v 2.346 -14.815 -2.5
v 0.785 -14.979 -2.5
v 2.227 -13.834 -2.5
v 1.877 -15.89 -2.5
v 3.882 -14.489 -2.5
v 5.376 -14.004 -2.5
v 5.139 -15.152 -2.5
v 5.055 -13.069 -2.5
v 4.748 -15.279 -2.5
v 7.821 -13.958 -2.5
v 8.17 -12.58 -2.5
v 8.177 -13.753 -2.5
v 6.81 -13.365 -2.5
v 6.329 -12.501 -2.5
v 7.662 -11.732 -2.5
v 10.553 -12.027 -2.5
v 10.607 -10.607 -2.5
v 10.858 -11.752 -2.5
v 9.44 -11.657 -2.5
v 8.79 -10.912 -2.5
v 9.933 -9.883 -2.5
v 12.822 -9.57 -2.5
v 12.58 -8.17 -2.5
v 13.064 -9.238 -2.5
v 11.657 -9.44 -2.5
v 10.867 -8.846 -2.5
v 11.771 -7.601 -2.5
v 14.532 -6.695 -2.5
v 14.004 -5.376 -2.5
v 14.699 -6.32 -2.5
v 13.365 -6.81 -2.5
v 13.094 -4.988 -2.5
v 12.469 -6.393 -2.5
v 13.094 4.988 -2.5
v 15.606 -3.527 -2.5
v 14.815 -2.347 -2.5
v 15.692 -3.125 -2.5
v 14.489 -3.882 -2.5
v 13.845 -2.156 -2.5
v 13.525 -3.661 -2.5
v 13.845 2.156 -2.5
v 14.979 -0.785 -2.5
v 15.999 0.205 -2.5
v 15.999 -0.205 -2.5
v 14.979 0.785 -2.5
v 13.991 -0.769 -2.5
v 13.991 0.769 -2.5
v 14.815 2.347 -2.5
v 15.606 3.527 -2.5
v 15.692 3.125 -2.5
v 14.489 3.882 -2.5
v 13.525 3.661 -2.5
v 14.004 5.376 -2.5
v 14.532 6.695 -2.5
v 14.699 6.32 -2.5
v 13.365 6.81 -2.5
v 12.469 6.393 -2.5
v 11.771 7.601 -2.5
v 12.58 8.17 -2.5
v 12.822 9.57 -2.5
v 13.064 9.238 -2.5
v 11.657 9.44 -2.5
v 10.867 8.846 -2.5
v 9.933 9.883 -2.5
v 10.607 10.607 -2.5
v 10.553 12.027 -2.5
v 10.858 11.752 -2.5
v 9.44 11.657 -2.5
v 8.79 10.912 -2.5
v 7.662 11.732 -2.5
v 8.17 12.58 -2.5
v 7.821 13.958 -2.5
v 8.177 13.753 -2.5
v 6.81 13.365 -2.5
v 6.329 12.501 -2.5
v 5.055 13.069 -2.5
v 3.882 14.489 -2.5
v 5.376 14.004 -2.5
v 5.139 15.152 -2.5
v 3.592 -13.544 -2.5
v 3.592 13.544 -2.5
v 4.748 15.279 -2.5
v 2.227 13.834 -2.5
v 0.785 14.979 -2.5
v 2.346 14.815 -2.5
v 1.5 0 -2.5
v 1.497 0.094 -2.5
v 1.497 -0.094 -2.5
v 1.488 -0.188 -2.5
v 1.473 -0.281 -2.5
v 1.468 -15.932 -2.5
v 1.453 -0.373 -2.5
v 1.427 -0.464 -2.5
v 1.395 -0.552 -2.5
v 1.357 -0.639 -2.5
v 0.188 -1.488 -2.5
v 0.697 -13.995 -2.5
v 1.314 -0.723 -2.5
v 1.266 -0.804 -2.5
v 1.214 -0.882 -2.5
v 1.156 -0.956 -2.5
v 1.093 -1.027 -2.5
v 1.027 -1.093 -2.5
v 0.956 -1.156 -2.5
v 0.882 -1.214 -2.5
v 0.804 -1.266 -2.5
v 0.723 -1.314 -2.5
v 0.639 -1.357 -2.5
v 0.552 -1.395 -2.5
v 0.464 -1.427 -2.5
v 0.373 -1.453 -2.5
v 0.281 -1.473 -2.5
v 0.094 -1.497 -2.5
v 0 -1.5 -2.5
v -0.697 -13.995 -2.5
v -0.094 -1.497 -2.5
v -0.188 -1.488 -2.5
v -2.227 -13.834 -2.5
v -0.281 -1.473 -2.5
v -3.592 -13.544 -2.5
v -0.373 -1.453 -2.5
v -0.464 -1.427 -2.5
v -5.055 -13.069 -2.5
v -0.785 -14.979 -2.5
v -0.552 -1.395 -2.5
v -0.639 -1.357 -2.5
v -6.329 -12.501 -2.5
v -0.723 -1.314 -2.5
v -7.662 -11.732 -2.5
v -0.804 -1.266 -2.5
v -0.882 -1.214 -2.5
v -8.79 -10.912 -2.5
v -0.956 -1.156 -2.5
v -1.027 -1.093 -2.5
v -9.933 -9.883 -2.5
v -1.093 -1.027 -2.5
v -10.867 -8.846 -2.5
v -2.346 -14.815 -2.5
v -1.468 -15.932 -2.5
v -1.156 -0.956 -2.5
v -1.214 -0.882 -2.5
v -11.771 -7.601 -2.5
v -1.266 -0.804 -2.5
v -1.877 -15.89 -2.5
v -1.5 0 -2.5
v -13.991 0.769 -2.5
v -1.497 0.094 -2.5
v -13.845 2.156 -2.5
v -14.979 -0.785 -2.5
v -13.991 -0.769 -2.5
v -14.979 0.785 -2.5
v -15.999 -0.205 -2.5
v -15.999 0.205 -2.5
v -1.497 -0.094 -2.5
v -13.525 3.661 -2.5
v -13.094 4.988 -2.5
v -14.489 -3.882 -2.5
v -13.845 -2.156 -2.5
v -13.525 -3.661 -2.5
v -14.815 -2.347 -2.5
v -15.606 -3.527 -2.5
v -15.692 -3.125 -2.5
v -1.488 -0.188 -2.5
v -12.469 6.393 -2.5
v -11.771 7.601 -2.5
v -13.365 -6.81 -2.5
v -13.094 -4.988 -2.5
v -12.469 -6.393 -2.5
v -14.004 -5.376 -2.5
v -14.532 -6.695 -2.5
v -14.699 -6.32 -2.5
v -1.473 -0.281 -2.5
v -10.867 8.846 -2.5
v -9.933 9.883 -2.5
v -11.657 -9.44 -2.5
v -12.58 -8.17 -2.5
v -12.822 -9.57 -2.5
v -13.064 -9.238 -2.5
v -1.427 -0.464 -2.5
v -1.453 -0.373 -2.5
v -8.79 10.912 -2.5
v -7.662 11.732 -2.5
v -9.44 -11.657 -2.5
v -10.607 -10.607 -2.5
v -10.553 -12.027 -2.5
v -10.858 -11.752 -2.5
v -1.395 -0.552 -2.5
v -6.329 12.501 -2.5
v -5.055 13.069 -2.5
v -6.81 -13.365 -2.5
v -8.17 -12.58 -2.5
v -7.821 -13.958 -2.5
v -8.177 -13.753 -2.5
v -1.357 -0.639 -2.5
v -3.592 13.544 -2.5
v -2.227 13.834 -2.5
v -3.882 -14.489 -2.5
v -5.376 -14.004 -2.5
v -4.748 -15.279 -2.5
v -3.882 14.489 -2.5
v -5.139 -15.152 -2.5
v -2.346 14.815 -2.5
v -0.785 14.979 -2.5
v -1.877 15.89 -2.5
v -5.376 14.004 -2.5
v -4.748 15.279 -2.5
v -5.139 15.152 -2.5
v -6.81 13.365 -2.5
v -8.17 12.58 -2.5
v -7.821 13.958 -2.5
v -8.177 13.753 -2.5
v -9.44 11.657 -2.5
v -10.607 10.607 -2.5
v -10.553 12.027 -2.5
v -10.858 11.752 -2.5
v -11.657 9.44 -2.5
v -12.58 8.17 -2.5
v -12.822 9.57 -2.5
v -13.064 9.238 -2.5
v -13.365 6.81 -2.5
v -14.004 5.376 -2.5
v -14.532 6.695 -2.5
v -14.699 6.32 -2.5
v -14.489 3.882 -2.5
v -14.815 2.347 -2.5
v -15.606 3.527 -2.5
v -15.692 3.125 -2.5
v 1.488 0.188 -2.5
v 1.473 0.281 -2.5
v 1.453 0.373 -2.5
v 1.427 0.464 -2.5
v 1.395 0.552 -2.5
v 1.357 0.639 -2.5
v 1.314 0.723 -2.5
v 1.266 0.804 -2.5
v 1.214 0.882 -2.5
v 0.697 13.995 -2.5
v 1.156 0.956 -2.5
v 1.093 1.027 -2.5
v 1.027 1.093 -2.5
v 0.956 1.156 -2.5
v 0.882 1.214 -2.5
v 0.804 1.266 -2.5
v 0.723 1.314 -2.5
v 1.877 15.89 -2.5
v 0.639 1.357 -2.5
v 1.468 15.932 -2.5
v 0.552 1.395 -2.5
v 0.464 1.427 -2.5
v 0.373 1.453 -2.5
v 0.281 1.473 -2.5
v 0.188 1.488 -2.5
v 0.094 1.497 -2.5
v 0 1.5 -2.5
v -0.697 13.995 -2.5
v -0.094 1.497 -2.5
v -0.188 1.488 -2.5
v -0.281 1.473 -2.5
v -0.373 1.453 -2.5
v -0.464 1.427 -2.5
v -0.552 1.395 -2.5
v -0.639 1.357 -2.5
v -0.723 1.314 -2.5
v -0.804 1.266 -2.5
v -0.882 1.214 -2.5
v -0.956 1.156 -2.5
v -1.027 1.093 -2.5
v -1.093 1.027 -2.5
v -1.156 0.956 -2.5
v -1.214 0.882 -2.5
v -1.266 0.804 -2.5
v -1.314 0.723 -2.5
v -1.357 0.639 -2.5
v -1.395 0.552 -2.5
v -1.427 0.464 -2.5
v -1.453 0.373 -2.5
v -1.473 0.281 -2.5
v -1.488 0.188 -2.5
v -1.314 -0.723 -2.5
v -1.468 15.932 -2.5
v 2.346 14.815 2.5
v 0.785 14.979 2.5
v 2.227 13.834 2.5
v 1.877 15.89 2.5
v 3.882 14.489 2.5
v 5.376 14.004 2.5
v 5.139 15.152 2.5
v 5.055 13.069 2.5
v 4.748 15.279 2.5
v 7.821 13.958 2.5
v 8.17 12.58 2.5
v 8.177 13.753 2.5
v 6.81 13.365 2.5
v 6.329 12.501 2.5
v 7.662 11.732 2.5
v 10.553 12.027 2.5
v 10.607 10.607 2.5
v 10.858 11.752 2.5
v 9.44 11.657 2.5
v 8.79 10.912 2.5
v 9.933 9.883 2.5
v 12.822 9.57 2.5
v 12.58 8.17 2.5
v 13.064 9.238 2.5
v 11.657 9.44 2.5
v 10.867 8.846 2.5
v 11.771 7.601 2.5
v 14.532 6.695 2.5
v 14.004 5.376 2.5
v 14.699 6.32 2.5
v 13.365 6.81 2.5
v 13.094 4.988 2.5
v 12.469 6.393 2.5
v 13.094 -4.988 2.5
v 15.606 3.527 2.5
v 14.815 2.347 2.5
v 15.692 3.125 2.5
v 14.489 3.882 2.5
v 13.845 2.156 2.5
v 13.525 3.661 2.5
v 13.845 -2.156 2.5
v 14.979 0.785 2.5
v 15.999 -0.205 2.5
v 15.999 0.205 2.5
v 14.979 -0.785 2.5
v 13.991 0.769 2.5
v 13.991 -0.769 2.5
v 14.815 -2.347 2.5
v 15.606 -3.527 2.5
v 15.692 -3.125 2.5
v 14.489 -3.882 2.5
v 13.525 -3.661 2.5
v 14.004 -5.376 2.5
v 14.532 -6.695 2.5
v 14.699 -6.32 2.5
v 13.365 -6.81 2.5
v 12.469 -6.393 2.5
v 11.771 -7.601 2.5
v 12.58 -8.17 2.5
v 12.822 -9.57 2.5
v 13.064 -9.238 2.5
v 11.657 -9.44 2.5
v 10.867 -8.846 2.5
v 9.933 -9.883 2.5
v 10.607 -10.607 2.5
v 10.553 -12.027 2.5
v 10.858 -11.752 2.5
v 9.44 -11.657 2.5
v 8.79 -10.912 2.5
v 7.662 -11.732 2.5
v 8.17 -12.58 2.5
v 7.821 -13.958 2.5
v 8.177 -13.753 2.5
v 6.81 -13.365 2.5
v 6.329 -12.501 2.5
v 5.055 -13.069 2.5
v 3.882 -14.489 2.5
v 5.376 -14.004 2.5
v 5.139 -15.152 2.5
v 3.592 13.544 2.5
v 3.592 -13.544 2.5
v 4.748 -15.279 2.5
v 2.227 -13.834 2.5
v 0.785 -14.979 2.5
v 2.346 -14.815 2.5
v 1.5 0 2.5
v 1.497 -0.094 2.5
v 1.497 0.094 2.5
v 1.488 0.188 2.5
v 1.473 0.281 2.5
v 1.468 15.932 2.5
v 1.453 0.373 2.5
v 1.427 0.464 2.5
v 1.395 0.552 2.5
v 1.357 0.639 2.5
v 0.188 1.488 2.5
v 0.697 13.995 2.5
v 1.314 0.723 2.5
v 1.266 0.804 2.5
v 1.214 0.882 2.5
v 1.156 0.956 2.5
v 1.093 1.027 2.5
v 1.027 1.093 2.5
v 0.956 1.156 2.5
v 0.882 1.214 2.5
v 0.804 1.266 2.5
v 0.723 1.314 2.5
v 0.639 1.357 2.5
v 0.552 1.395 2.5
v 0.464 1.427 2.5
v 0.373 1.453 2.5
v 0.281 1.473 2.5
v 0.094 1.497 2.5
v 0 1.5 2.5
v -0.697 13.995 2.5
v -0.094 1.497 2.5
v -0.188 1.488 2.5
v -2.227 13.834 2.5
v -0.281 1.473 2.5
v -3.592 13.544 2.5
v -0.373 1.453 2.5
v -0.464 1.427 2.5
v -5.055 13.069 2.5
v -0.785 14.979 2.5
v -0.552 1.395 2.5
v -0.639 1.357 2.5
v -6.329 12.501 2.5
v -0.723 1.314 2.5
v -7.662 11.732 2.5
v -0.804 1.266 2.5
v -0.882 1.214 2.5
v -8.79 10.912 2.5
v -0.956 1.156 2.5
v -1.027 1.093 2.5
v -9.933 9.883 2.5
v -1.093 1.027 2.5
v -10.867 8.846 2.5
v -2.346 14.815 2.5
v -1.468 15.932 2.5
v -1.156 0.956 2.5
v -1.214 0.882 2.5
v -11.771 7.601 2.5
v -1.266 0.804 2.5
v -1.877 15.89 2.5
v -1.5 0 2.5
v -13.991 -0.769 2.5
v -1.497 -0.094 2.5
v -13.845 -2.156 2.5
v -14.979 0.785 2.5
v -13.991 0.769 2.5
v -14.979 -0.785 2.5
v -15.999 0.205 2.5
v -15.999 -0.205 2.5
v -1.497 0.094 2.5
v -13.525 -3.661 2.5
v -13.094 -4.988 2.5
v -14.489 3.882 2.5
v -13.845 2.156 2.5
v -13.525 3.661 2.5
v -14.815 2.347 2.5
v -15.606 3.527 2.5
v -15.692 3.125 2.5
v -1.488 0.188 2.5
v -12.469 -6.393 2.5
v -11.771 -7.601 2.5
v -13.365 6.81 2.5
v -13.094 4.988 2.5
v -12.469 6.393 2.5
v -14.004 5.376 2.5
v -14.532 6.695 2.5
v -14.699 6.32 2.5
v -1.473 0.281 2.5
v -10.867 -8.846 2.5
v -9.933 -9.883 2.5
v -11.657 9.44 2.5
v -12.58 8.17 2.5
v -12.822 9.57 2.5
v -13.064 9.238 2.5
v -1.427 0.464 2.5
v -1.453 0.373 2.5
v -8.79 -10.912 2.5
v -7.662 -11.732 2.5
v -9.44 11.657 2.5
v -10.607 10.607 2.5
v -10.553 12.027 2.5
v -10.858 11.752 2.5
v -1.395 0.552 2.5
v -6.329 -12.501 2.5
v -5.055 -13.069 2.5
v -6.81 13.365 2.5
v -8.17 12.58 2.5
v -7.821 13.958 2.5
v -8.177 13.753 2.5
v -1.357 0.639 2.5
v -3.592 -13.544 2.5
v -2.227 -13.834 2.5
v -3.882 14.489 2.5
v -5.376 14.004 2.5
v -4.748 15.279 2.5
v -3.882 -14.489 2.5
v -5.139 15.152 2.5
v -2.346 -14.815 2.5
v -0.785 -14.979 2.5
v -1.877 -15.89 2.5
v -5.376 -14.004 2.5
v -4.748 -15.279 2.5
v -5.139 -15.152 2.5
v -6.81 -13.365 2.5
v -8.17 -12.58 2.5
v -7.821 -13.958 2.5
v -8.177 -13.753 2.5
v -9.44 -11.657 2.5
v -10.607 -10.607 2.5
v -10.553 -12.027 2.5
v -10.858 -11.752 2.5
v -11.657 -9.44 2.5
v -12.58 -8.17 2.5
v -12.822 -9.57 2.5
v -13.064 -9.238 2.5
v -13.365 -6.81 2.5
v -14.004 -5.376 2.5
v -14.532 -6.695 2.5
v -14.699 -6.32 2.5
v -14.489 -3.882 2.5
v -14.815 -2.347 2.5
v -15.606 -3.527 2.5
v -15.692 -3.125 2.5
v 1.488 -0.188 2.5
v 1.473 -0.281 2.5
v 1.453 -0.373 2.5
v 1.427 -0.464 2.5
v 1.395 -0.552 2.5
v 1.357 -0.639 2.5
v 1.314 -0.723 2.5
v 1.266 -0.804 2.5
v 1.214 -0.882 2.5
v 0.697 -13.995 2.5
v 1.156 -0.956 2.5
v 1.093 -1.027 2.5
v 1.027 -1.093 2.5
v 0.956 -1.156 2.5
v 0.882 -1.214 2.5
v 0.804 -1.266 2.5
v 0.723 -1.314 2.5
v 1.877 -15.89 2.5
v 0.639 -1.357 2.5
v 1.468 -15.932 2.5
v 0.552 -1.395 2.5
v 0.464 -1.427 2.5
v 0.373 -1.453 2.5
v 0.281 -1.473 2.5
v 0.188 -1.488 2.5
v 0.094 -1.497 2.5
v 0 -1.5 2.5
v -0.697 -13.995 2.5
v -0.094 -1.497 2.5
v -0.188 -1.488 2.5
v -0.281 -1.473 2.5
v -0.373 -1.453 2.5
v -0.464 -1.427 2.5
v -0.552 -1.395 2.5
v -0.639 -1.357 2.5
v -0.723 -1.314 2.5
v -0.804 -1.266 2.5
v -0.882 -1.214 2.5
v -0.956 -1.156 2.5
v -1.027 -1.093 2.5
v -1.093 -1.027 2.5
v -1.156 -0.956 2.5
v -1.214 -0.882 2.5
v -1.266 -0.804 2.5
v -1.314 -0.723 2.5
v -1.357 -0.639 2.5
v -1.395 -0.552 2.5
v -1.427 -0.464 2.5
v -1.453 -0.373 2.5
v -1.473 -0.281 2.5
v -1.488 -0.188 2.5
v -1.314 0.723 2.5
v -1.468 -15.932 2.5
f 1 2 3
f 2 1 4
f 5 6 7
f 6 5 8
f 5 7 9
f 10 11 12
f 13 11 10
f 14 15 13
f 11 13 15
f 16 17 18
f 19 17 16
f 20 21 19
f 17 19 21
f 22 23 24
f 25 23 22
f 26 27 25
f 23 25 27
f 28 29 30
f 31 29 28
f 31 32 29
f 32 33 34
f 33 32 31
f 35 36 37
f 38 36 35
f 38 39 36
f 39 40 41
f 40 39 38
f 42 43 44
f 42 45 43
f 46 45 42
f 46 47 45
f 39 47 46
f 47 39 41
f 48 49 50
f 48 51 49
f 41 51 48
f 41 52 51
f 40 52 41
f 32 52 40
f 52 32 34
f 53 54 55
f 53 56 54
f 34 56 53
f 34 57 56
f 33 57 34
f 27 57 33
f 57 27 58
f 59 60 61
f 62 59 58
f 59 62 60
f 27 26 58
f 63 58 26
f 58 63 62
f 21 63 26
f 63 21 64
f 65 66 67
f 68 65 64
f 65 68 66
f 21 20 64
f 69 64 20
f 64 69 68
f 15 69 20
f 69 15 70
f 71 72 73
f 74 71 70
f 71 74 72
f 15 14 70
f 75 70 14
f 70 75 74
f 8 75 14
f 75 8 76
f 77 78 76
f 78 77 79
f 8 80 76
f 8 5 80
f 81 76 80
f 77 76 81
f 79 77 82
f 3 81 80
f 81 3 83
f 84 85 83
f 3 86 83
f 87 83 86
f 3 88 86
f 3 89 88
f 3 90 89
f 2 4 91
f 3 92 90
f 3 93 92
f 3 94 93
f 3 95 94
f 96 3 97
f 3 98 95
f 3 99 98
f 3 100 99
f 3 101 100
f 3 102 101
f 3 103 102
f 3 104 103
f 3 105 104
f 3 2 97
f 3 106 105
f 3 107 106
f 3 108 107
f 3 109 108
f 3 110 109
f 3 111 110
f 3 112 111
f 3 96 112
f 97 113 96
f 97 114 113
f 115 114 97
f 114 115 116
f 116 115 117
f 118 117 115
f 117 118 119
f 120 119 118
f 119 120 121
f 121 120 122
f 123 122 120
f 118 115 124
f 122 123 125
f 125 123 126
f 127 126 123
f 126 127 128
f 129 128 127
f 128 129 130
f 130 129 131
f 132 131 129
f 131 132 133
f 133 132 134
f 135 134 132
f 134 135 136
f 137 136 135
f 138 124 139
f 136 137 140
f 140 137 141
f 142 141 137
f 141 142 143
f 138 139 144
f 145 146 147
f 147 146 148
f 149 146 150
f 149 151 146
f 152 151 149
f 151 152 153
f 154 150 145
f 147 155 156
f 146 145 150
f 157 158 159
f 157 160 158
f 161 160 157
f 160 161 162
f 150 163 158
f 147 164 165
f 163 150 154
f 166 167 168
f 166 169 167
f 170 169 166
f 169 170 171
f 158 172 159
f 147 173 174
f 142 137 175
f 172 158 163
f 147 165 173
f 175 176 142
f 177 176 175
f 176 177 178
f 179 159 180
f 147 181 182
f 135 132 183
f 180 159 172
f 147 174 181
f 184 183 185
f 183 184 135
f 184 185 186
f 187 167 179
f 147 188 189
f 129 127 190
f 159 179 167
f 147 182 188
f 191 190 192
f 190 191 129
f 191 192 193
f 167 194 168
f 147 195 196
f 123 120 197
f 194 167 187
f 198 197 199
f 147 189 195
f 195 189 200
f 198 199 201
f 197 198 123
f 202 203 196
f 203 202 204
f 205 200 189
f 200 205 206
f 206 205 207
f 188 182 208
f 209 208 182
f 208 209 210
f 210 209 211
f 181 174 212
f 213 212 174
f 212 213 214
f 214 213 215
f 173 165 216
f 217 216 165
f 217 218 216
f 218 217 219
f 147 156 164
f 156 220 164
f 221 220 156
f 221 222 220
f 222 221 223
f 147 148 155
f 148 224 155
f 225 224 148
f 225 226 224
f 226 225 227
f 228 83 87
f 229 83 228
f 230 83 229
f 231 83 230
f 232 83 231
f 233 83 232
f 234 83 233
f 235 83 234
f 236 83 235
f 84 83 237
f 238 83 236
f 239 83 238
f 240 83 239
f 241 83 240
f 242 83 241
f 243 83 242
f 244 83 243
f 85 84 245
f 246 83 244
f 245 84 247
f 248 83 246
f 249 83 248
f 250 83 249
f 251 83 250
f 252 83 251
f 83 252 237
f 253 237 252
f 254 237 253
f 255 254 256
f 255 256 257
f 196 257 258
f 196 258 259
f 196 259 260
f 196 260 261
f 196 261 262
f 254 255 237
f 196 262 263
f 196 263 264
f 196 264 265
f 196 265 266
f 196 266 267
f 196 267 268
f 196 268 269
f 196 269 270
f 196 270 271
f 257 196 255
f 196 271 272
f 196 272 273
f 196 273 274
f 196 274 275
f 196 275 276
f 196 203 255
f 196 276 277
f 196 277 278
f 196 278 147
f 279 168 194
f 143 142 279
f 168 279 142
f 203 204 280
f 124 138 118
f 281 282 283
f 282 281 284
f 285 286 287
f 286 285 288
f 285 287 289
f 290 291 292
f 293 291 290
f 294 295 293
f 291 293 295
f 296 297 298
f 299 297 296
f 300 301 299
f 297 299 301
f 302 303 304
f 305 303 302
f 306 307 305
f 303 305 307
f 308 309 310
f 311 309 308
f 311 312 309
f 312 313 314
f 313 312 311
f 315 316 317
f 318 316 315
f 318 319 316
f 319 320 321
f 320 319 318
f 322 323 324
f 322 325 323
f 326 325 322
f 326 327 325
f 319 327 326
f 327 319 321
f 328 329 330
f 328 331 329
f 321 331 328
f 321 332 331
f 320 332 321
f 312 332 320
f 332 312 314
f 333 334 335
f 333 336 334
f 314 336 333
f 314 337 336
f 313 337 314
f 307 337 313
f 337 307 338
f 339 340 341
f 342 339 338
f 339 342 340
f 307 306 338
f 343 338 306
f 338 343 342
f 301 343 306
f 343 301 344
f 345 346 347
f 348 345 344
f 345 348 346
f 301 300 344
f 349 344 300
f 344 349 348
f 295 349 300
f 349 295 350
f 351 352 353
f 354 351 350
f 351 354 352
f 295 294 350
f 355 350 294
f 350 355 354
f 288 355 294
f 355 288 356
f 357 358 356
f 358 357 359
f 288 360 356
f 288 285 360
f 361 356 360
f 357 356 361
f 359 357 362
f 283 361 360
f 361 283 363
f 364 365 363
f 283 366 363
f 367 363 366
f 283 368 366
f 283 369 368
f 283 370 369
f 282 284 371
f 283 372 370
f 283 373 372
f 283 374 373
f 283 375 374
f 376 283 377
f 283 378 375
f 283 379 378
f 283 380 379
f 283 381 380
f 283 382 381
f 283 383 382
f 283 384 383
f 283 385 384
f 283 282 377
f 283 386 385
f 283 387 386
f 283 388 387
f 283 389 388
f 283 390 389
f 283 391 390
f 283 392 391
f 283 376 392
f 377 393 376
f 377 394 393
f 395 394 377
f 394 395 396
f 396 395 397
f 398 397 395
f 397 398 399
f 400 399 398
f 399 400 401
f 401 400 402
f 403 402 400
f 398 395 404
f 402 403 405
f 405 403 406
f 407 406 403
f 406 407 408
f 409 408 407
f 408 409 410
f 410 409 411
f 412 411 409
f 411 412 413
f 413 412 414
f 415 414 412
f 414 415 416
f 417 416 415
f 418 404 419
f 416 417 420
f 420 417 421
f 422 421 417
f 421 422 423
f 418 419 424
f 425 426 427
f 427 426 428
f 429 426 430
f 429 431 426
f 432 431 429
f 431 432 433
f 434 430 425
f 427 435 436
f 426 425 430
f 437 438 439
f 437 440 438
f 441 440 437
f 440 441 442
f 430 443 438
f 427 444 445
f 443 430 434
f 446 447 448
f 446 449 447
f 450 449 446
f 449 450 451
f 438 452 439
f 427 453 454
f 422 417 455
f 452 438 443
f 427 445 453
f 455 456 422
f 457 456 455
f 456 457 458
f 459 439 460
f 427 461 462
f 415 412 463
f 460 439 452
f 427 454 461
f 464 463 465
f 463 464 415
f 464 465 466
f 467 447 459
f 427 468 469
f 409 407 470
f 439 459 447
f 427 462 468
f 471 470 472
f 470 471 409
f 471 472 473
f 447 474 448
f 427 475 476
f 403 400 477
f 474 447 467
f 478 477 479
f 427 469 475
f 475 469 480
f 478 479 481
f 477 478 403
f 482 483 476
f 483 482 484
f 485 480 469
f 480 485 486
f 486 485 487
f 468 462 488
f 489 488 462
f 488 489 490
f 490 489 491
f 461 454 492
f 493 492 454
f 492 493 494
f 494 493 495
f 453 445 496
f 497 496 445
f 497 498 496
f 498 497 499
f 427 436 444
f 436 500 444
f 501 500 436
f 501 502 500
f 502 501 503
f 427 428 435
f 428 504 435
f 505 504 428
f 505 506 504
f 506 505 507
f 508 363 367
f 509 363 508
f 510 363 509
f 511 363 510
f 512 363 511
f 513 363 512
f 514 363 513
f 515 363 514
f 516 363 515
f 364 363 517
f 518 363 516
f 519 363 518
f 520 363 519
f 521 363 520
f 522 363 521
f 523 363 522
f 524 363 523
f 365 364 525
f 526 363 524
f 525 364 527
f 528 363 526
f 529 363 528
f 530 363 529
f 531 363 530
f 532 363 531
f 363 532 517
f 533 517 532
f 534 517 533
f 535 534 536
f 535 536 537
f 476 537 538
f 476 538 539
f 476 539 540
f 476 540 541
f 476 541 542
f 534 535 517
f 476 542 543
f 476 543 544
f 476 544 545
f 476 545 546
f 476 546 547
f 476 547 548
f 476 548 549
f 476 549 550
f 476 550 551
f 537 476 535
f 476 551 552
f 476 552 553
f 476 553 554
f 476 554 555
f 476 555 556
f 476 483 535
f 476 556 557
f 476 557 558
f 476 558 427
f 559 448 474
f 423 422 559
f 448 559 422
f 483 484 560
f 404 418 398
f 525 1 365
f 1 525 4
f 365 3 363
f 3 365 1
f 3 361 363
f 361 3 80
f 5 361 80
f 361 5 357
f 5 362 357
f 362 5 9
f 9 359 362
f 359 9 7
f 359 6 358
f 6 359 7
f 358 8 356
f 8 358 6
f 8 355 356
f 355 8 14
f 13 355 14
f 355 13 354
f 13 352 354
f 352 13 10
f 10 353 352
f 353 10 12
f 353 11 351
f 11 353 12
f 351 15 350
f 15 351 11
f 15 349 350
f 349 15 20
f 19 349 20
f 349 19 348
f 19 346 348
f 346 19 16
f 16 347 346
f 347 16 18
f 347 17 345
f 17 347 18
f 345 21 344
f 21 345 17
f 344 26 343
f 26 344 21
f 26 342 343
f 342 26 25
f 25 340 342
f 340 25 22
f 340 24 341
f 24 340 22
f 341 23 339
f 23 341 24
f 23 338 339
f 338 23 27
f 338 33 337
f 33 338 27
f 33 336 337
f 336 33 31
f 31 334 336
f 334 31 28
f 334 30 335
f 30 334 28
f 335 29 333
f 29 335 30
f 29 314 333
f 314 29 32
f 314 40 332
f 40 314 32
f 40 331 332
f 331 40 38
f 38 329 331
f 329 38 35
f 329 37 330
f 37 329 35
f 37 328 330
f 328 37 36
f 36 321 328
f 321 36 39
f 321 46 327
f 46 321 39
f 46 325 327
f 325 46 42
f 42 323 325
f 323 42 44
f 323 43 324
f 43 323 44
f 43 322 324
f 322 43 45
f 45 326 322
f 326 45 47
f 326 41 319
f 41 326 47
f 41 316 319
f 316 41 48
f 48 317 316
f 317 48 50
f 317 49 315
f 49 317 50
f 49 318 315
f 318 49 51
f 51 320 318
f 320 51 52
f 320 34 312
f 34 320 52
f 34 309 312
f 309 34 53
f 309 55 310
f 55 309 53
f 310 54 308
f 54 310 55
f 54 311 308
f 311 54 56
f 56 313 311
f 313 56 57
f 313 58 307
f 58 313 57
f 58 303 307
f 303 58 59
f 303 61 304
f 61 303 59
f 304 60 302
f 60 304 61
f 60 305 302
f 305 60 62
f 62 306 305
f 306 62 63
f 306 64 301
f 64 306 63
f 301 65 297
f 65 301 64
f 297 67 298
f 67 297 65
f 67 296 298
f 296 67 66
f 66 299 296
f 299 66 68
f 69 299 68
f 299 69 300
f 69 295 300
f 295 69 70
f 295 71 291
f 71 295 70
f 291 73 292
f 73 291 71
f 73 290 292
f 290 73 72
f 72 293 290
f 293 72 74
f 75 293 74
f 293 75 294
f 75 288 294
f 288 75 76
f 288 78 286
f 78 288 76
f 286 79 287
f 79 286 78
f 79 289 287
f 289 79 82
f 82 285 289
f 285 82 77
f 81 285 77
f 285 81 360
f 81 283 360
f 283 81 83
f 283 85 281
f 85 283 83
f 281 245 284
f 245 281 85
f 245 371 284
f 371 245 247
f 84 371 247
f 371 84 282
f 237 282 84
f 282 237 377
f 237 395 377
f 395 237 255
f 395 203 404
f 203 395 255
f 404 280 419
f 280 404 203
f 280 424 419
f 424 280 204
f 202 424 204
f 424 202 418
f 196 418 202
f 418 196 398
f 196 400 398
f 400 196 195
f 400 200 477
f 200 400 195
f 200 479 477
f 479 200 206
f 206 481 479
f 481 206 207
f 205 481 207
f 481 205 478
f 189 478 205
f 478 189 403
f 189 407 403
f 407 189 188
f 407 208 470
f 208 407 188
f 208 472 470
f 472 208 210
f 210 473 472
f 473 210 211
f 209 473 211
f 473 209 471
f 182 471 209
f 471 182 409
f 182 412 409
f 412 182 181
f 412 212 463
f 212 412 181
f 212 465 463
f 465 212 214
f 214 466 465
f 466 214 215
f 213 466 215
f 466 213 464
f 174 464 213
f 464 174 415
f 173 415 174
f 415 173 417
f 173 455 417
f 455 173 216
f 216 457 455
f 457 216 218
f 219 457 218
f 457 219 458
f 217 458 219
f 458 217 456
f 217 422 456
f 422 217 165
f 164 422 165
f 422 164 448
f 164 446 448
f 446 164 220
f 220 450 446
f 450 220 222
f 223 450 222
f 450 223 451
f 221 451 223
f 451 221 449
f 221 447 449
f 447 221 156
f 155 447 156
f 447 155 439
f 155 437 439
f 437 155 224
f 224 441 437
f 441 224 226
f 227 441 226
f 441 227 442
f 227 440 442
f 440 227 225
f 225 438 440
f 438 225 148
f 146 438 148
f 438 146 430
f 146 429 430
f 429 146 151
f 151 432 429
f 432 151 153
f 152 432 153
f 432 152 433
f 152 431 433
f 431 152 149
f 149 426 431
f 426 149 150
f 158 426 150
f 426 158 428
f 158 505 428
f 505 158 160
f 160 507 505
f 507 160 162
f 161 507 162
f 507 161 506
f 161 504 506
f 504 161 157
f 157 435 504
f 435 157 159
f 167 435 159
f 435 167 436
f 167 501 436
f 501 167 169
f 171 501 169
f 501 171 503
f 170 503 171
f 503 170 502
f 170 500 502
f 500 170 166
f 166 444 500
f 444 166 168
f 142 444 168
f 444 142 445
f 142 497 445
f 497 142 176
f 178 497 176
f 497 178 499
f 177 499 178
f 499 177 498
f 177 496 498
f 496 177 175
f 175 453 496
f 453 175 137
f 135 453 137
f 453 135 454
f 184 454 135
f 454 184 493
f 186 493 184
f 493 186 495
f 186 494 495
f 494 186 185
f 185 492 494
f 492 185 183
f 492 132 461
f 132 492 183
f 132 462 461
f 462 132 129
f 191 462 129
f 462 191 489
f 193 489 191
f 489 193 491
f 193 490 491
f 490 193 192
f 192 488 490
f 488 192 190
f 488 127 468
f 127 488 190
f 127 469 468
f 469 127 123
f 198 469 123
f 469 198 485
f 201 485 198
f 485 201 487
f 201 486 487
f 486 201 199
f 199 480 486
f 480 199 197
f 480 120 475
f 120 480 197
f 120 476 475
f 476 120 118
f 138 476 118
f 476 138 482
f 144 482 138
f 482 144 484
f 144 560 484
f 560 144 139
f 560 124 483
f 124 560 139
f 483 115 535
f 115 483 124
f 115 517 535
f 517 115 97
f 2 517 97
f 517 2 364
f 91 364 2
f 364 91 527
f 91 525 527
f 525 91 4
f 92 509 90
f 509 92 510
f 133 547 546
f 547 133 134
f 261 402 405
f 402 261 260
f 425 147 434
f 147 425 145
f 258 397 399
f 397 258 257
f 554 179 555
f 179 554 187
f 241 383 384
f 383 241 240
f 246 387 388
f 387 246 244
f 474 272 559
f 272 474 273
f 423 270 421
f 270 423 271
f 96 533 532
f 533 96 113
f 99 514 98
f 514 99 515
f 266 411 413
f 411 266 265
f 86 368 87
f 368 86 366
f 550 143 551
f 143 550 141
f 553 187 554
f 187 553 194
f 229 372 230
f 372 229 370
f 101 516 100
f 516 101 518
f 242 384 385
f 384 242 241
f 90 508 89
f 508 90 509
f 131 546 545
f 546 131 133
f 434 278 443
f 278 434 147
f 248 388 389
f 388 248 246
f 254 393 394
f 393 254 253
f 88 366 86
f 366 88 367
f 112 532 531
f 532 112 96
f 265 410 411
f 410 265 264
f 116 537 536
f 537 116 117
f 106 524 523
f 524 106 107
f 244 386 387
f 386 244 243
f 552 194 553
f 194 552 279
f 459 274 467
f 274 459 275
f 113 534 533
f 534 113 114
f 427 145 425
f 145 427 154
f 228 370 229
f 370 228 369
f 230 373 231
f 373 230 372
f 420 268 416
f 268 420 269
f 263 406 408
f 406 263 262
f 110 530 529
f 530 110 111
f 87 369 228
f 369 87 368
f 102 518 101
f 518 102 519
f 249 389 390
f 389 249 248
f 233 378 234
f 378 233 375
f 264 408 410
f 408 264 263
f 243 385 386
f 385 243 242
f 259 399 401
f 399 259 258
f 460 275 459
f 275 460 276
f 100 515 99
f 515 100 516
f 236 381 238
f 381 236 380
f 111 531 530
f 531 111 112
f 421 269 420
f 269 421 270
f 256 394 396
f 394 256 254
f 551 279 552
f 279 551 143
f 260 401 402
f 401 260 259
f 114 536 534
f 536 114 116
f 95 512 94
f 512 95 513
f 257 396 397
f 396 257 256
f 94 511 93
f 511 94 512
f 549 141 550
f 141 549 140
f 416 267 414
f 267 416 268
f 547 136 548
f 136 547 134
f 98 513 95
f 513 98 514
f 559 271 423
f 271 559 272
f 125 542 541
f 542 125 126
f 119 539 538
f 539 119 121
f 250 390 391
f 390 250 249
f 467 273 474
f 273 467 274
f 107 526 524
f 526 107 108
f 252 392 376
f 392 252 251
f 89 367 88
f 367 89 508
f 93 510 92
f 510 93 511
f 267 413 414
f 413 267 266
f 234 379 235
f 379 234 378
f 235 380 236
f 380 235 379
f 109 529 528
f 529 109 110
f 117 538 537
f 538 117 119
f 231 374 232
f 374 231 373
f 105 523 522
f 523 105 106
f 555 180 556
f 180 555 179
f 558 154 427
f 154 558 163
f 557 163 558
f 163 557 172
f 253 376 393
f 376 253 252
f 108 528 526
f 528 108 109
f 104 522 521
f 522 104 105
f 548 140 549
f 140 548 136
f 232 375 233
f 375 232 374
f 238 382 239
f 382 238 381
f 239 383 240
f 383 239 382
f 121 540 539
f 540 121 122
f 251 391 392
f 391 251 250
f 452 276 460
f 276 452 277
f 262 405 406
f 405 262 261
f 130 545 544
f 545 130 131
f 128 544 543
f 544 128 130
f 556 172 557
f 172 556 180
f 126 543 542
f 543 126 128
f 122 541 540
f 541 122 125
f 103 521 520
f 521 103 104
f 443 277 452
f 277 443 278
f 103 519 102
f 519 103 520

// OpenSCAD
height = 5;
type = "Spur"; // [Spur,Cog,Double Helix, Single Helix]
teeth = 30;	//	[18:50]

hole = "Yes"; //[Yes,No]
rotate_Offset_double_Helix_only = 5; //[0:20]

holeSize = 1.5;//don't make too big or your gear will disappear
scale = 100;//this is here temperarily I would not reccomend changing!


if (type == "Spur")
{
if(hole == "Yes")
{
hole();
}
else
{
spur();
}
}
else if(type == "Cog")
{
if(hole == "Yes")
{
hole();
}
else
{
cog();
}
}
else if(type == "Double Helix")
{

if(hole == "Yes")
{
hole();
}
else
{
double_helix();
}
}
else if (type == "Single Helix")
{
if(hole == "Yes")
{
hole();
}
else
{
single_helix();
}
}


module gear(number_of_teeth,
		circular_pitch=false, diametral_pitch=false,
		pressure_angle=20, clearance = 0)
{

	//Convert diametrial pitch to our native circular pitch
	circular_pitch = (circular_pitch!=false?circular_pitch:180/diametral_pitch);

	// Pitch diameter: Diameter of pitch circle.
	pitch_diameter  =  number_of_teeth * circular_pitch / 180;
	pitch_radius = pitch_diameter/2;

	// Base Circle
	base_diameter = pitch_diameter*cos(pressure_angle);
	base_radius = base_diameter/2;

	// Diametrial pitch: Number of teeth per unit length.
	pitch_diametrial = number_of_teeth / pitch_diameter;

	// Addendum: Radial distance from pitch circle to outside circle.
	addendum = 1/pitch_diametrial;

	//Outer Circle
	outer_radius = pitch_radius+addendum;
	outer_diameter = outer_radius*2;

	// Dedendum: Radial distance from pitch circle to root diameter
	dedendum = addendum + clearance;

	// Root diameter: Diameter of bottom of tooth spaces.
	root_radius = pitch_radius-dedendum;
	root_diameter = root_radius * 2;

	half_thick_angle = 360 / (4 * number_of_teeth);

	union()
	{
		rotate(half_thick_angle) circle($fn=number_of_teeth*2, r=root_radius*1.001);

		for (i= [1:number_of_teeth])
		//for (i = [0])
		{
			rotate([0,0,i*360/number_of_teeth])
			{
				involute_gear_tooth(
					pitch_radius = pitch_radius,
					root_radius = root_radius,
					base_radius = base_radius-6,
					outer_radius = outer_radius,
					half_thick_angle = half_thick_angle);
			}
		}
	}
}


module involute_gear_tooth(
					pitch_radius,
					root_radius,
					base_radius,
					outer_radius,
					half_thick_angle
					)
{
	pitch_to_base_angle  = involute_intersect_angle( base_radius, pitch_radius );

	outer_to_base_angle = involute_intersect_angle( base_radius/2, outer_radius*1);

	base1 = 0 - pitch_to_base_angle - half_thick_angle;
	pitch1 = 0 - half_thick_angle;
	outer1 = outer_to_base_angle - pitch_to_base_angle - half_thick_angle;

	b1 = polar_to_cartesian([ base1, base_radius ]);
	p1 = polar_to_cartesian([ pitch1, pitch_radius ]);
	o1 = polar_to_cartesian([ outer1, outer_radius ]);

	b2 = polar_to_cartesian([ -base1, base_radius ]);
	p2 = polar_to_cartesian([ -pitch1, pitch_radius ]);
	o2 = polar_to_cartesian([ -outer1, outer_radius ]);

	// ( root_radius > base_radius variables )
		pitch_to_root_angle = pitch_to_base_angle - involute_intersect_angle(base_radius, root_radius );
		root1 = pitch1 - pitch_to_root_angle;
		root2 = -pitch1 + pitch_to_root_angle;
		r1_t =  polar_to_cartesian([ root1, root_radius ]);
		r2_t =  polar_to_cartesian([ -root1, root_radius ]);

	// ( else )
		r1_f =  polar_to_cartesian([ base1, root_radius ]);
		r2_f =  polar_to_cartesian([ -base1, root_radius ]);

	if (root_radius > base_radius)
	{
		//echo("true");
		polygon( points = [
			r1_t,p1,o1,o2,p2,r2_t
		], convexity = 3);
	}
	else
	{
		polygon( points = [
			r1_f, b1,p1,o1,o2,p2,b2,r2_f
		], convexity = 3);
	}

}

// Mathematical Functions
//===============

// Finds the angle of the involute about the base radius at the given distance (radius) from it's center.
//source: http://www.mathhelpforum.com/math-help/geometry/136011-circle-involute-solving-y-any-given-x.html

function involute_intersect_angle(base_radius, radius) = sqrt( pow(radius/base_radius,2) - 1);



// Polar coord [angle, radius] to cartesian coord [x,y]

function polar_to_cartesian(polar) = [
	polar[1]*cos(polar[0]),
	polar[1]*sin(polar[0])
];


// Test Cases
//===============

module test_gears()
{
	gear(number_of_teeth=51,circular_pitch=200);
	translate([0, 50])gear(number_of_teeth=17,circular_pitch=200);
	translate([-50,0]) gear(number_of_teeth=17,diametral_pitch=1);
}
module cog()
{
		gear(number_of_teeth=teeth,diametral_pitch=scale/100);

}
module single_helix()
{
	translate([50,0]);
	{
	linear_extrude(height = height, center = true, convexity = 10, twist = -45)
	 gear(number_of_teeth=teeth,diametral_pitch=scale/100);
	}
}
module double_helix()
{



linear_extrude(height = height, center = true, convexity = 10, twist = -45)
	 gear(number_of_teeth=teeth,diametral_pitch=scale/100);
	translate([0,0,height])
	rotate([0,0,rotate_Offset_double_Helix_only])
 linear_extrude(height = height, center = true, convexity = 10, twist = 45)
	 gear(number_of_teeth=teeth,diametral_pitch=scale/100);

}
module spur()
{

		translate([0,0]) linear_extrude(height = height, center = true, convexity = 10, twist = 0)
	 gear(number_of_teeth=teeth,diametral_pitch=1);


}

module demo_3d_gears()
{
	//double helical gear
	// (helics don't line up perfectly - for display purposes only ;)
	translate([50,0])
	{
	linear_extrude(height = 10, center = true, convexity = 10, twist = -45)
	 gear(number_of_teeth=17,diametral_pitch=1);
	translate([0,0,10]) linear_extrude(height = height, center = true, convexity = 10, twist = 45)
	 gear(number_of_teeth=17,diametral_pitch=1);
	}

	//spur gear
	translate([0,-50]) linear_extrude(height = height, center = true, convexity = 10, twist = 0)
	 gear(number_of_teeth=17,diametral_pitch=1);

}
module hole() {
   difference() {
if(type == "Spur")
{
translate([0,0]) linear_extrude(height = height, center = true, convexity = 10, twist = 0)
	 gear(number_of_teeth=teeth,diametral_pitch=1);
}
else if(type == "Cog")
{
gear(number_of_teeth=teeth,diametral_pitch=scale/100);
}
else if (type == "Double Helix")
{
linear_extrude(height = height, center = true, convexity = 10, twist = -45)
	 gear(number_of_teeth=teeth,diametral_pitch=scale/100);
	translate([0,0,height])
	rotate([0,0,rotate_Offset_double_Helix_only])
 linear_extrude(height = height, center = true, convexity = 10, twist = 45)
	 gear(number_of_teeth=teeth,diametral_pitch=scale/100);

}
else if (type == "Single Helix")
{
linear_extrude(height = height, center = true, convexity = 10, twist = -45)
	 gear(number_of_teeth=teeth,diametral_pitch=scale/100);
}
# rotate ([0,0,0]) cylinder (h = height*4, r=holeSize, center = true, $fn=100);
}
}




module test_involute_curve()
{
	for (i=[0,1,2,3,4,5,6,7,8,9,10,11,12,13,14,15])
	{
		translate(polar_to_cartesian([involute_intersect_angle( 0.1,i) , i ])) circle($fn=15, r=0.5);
	}
}
